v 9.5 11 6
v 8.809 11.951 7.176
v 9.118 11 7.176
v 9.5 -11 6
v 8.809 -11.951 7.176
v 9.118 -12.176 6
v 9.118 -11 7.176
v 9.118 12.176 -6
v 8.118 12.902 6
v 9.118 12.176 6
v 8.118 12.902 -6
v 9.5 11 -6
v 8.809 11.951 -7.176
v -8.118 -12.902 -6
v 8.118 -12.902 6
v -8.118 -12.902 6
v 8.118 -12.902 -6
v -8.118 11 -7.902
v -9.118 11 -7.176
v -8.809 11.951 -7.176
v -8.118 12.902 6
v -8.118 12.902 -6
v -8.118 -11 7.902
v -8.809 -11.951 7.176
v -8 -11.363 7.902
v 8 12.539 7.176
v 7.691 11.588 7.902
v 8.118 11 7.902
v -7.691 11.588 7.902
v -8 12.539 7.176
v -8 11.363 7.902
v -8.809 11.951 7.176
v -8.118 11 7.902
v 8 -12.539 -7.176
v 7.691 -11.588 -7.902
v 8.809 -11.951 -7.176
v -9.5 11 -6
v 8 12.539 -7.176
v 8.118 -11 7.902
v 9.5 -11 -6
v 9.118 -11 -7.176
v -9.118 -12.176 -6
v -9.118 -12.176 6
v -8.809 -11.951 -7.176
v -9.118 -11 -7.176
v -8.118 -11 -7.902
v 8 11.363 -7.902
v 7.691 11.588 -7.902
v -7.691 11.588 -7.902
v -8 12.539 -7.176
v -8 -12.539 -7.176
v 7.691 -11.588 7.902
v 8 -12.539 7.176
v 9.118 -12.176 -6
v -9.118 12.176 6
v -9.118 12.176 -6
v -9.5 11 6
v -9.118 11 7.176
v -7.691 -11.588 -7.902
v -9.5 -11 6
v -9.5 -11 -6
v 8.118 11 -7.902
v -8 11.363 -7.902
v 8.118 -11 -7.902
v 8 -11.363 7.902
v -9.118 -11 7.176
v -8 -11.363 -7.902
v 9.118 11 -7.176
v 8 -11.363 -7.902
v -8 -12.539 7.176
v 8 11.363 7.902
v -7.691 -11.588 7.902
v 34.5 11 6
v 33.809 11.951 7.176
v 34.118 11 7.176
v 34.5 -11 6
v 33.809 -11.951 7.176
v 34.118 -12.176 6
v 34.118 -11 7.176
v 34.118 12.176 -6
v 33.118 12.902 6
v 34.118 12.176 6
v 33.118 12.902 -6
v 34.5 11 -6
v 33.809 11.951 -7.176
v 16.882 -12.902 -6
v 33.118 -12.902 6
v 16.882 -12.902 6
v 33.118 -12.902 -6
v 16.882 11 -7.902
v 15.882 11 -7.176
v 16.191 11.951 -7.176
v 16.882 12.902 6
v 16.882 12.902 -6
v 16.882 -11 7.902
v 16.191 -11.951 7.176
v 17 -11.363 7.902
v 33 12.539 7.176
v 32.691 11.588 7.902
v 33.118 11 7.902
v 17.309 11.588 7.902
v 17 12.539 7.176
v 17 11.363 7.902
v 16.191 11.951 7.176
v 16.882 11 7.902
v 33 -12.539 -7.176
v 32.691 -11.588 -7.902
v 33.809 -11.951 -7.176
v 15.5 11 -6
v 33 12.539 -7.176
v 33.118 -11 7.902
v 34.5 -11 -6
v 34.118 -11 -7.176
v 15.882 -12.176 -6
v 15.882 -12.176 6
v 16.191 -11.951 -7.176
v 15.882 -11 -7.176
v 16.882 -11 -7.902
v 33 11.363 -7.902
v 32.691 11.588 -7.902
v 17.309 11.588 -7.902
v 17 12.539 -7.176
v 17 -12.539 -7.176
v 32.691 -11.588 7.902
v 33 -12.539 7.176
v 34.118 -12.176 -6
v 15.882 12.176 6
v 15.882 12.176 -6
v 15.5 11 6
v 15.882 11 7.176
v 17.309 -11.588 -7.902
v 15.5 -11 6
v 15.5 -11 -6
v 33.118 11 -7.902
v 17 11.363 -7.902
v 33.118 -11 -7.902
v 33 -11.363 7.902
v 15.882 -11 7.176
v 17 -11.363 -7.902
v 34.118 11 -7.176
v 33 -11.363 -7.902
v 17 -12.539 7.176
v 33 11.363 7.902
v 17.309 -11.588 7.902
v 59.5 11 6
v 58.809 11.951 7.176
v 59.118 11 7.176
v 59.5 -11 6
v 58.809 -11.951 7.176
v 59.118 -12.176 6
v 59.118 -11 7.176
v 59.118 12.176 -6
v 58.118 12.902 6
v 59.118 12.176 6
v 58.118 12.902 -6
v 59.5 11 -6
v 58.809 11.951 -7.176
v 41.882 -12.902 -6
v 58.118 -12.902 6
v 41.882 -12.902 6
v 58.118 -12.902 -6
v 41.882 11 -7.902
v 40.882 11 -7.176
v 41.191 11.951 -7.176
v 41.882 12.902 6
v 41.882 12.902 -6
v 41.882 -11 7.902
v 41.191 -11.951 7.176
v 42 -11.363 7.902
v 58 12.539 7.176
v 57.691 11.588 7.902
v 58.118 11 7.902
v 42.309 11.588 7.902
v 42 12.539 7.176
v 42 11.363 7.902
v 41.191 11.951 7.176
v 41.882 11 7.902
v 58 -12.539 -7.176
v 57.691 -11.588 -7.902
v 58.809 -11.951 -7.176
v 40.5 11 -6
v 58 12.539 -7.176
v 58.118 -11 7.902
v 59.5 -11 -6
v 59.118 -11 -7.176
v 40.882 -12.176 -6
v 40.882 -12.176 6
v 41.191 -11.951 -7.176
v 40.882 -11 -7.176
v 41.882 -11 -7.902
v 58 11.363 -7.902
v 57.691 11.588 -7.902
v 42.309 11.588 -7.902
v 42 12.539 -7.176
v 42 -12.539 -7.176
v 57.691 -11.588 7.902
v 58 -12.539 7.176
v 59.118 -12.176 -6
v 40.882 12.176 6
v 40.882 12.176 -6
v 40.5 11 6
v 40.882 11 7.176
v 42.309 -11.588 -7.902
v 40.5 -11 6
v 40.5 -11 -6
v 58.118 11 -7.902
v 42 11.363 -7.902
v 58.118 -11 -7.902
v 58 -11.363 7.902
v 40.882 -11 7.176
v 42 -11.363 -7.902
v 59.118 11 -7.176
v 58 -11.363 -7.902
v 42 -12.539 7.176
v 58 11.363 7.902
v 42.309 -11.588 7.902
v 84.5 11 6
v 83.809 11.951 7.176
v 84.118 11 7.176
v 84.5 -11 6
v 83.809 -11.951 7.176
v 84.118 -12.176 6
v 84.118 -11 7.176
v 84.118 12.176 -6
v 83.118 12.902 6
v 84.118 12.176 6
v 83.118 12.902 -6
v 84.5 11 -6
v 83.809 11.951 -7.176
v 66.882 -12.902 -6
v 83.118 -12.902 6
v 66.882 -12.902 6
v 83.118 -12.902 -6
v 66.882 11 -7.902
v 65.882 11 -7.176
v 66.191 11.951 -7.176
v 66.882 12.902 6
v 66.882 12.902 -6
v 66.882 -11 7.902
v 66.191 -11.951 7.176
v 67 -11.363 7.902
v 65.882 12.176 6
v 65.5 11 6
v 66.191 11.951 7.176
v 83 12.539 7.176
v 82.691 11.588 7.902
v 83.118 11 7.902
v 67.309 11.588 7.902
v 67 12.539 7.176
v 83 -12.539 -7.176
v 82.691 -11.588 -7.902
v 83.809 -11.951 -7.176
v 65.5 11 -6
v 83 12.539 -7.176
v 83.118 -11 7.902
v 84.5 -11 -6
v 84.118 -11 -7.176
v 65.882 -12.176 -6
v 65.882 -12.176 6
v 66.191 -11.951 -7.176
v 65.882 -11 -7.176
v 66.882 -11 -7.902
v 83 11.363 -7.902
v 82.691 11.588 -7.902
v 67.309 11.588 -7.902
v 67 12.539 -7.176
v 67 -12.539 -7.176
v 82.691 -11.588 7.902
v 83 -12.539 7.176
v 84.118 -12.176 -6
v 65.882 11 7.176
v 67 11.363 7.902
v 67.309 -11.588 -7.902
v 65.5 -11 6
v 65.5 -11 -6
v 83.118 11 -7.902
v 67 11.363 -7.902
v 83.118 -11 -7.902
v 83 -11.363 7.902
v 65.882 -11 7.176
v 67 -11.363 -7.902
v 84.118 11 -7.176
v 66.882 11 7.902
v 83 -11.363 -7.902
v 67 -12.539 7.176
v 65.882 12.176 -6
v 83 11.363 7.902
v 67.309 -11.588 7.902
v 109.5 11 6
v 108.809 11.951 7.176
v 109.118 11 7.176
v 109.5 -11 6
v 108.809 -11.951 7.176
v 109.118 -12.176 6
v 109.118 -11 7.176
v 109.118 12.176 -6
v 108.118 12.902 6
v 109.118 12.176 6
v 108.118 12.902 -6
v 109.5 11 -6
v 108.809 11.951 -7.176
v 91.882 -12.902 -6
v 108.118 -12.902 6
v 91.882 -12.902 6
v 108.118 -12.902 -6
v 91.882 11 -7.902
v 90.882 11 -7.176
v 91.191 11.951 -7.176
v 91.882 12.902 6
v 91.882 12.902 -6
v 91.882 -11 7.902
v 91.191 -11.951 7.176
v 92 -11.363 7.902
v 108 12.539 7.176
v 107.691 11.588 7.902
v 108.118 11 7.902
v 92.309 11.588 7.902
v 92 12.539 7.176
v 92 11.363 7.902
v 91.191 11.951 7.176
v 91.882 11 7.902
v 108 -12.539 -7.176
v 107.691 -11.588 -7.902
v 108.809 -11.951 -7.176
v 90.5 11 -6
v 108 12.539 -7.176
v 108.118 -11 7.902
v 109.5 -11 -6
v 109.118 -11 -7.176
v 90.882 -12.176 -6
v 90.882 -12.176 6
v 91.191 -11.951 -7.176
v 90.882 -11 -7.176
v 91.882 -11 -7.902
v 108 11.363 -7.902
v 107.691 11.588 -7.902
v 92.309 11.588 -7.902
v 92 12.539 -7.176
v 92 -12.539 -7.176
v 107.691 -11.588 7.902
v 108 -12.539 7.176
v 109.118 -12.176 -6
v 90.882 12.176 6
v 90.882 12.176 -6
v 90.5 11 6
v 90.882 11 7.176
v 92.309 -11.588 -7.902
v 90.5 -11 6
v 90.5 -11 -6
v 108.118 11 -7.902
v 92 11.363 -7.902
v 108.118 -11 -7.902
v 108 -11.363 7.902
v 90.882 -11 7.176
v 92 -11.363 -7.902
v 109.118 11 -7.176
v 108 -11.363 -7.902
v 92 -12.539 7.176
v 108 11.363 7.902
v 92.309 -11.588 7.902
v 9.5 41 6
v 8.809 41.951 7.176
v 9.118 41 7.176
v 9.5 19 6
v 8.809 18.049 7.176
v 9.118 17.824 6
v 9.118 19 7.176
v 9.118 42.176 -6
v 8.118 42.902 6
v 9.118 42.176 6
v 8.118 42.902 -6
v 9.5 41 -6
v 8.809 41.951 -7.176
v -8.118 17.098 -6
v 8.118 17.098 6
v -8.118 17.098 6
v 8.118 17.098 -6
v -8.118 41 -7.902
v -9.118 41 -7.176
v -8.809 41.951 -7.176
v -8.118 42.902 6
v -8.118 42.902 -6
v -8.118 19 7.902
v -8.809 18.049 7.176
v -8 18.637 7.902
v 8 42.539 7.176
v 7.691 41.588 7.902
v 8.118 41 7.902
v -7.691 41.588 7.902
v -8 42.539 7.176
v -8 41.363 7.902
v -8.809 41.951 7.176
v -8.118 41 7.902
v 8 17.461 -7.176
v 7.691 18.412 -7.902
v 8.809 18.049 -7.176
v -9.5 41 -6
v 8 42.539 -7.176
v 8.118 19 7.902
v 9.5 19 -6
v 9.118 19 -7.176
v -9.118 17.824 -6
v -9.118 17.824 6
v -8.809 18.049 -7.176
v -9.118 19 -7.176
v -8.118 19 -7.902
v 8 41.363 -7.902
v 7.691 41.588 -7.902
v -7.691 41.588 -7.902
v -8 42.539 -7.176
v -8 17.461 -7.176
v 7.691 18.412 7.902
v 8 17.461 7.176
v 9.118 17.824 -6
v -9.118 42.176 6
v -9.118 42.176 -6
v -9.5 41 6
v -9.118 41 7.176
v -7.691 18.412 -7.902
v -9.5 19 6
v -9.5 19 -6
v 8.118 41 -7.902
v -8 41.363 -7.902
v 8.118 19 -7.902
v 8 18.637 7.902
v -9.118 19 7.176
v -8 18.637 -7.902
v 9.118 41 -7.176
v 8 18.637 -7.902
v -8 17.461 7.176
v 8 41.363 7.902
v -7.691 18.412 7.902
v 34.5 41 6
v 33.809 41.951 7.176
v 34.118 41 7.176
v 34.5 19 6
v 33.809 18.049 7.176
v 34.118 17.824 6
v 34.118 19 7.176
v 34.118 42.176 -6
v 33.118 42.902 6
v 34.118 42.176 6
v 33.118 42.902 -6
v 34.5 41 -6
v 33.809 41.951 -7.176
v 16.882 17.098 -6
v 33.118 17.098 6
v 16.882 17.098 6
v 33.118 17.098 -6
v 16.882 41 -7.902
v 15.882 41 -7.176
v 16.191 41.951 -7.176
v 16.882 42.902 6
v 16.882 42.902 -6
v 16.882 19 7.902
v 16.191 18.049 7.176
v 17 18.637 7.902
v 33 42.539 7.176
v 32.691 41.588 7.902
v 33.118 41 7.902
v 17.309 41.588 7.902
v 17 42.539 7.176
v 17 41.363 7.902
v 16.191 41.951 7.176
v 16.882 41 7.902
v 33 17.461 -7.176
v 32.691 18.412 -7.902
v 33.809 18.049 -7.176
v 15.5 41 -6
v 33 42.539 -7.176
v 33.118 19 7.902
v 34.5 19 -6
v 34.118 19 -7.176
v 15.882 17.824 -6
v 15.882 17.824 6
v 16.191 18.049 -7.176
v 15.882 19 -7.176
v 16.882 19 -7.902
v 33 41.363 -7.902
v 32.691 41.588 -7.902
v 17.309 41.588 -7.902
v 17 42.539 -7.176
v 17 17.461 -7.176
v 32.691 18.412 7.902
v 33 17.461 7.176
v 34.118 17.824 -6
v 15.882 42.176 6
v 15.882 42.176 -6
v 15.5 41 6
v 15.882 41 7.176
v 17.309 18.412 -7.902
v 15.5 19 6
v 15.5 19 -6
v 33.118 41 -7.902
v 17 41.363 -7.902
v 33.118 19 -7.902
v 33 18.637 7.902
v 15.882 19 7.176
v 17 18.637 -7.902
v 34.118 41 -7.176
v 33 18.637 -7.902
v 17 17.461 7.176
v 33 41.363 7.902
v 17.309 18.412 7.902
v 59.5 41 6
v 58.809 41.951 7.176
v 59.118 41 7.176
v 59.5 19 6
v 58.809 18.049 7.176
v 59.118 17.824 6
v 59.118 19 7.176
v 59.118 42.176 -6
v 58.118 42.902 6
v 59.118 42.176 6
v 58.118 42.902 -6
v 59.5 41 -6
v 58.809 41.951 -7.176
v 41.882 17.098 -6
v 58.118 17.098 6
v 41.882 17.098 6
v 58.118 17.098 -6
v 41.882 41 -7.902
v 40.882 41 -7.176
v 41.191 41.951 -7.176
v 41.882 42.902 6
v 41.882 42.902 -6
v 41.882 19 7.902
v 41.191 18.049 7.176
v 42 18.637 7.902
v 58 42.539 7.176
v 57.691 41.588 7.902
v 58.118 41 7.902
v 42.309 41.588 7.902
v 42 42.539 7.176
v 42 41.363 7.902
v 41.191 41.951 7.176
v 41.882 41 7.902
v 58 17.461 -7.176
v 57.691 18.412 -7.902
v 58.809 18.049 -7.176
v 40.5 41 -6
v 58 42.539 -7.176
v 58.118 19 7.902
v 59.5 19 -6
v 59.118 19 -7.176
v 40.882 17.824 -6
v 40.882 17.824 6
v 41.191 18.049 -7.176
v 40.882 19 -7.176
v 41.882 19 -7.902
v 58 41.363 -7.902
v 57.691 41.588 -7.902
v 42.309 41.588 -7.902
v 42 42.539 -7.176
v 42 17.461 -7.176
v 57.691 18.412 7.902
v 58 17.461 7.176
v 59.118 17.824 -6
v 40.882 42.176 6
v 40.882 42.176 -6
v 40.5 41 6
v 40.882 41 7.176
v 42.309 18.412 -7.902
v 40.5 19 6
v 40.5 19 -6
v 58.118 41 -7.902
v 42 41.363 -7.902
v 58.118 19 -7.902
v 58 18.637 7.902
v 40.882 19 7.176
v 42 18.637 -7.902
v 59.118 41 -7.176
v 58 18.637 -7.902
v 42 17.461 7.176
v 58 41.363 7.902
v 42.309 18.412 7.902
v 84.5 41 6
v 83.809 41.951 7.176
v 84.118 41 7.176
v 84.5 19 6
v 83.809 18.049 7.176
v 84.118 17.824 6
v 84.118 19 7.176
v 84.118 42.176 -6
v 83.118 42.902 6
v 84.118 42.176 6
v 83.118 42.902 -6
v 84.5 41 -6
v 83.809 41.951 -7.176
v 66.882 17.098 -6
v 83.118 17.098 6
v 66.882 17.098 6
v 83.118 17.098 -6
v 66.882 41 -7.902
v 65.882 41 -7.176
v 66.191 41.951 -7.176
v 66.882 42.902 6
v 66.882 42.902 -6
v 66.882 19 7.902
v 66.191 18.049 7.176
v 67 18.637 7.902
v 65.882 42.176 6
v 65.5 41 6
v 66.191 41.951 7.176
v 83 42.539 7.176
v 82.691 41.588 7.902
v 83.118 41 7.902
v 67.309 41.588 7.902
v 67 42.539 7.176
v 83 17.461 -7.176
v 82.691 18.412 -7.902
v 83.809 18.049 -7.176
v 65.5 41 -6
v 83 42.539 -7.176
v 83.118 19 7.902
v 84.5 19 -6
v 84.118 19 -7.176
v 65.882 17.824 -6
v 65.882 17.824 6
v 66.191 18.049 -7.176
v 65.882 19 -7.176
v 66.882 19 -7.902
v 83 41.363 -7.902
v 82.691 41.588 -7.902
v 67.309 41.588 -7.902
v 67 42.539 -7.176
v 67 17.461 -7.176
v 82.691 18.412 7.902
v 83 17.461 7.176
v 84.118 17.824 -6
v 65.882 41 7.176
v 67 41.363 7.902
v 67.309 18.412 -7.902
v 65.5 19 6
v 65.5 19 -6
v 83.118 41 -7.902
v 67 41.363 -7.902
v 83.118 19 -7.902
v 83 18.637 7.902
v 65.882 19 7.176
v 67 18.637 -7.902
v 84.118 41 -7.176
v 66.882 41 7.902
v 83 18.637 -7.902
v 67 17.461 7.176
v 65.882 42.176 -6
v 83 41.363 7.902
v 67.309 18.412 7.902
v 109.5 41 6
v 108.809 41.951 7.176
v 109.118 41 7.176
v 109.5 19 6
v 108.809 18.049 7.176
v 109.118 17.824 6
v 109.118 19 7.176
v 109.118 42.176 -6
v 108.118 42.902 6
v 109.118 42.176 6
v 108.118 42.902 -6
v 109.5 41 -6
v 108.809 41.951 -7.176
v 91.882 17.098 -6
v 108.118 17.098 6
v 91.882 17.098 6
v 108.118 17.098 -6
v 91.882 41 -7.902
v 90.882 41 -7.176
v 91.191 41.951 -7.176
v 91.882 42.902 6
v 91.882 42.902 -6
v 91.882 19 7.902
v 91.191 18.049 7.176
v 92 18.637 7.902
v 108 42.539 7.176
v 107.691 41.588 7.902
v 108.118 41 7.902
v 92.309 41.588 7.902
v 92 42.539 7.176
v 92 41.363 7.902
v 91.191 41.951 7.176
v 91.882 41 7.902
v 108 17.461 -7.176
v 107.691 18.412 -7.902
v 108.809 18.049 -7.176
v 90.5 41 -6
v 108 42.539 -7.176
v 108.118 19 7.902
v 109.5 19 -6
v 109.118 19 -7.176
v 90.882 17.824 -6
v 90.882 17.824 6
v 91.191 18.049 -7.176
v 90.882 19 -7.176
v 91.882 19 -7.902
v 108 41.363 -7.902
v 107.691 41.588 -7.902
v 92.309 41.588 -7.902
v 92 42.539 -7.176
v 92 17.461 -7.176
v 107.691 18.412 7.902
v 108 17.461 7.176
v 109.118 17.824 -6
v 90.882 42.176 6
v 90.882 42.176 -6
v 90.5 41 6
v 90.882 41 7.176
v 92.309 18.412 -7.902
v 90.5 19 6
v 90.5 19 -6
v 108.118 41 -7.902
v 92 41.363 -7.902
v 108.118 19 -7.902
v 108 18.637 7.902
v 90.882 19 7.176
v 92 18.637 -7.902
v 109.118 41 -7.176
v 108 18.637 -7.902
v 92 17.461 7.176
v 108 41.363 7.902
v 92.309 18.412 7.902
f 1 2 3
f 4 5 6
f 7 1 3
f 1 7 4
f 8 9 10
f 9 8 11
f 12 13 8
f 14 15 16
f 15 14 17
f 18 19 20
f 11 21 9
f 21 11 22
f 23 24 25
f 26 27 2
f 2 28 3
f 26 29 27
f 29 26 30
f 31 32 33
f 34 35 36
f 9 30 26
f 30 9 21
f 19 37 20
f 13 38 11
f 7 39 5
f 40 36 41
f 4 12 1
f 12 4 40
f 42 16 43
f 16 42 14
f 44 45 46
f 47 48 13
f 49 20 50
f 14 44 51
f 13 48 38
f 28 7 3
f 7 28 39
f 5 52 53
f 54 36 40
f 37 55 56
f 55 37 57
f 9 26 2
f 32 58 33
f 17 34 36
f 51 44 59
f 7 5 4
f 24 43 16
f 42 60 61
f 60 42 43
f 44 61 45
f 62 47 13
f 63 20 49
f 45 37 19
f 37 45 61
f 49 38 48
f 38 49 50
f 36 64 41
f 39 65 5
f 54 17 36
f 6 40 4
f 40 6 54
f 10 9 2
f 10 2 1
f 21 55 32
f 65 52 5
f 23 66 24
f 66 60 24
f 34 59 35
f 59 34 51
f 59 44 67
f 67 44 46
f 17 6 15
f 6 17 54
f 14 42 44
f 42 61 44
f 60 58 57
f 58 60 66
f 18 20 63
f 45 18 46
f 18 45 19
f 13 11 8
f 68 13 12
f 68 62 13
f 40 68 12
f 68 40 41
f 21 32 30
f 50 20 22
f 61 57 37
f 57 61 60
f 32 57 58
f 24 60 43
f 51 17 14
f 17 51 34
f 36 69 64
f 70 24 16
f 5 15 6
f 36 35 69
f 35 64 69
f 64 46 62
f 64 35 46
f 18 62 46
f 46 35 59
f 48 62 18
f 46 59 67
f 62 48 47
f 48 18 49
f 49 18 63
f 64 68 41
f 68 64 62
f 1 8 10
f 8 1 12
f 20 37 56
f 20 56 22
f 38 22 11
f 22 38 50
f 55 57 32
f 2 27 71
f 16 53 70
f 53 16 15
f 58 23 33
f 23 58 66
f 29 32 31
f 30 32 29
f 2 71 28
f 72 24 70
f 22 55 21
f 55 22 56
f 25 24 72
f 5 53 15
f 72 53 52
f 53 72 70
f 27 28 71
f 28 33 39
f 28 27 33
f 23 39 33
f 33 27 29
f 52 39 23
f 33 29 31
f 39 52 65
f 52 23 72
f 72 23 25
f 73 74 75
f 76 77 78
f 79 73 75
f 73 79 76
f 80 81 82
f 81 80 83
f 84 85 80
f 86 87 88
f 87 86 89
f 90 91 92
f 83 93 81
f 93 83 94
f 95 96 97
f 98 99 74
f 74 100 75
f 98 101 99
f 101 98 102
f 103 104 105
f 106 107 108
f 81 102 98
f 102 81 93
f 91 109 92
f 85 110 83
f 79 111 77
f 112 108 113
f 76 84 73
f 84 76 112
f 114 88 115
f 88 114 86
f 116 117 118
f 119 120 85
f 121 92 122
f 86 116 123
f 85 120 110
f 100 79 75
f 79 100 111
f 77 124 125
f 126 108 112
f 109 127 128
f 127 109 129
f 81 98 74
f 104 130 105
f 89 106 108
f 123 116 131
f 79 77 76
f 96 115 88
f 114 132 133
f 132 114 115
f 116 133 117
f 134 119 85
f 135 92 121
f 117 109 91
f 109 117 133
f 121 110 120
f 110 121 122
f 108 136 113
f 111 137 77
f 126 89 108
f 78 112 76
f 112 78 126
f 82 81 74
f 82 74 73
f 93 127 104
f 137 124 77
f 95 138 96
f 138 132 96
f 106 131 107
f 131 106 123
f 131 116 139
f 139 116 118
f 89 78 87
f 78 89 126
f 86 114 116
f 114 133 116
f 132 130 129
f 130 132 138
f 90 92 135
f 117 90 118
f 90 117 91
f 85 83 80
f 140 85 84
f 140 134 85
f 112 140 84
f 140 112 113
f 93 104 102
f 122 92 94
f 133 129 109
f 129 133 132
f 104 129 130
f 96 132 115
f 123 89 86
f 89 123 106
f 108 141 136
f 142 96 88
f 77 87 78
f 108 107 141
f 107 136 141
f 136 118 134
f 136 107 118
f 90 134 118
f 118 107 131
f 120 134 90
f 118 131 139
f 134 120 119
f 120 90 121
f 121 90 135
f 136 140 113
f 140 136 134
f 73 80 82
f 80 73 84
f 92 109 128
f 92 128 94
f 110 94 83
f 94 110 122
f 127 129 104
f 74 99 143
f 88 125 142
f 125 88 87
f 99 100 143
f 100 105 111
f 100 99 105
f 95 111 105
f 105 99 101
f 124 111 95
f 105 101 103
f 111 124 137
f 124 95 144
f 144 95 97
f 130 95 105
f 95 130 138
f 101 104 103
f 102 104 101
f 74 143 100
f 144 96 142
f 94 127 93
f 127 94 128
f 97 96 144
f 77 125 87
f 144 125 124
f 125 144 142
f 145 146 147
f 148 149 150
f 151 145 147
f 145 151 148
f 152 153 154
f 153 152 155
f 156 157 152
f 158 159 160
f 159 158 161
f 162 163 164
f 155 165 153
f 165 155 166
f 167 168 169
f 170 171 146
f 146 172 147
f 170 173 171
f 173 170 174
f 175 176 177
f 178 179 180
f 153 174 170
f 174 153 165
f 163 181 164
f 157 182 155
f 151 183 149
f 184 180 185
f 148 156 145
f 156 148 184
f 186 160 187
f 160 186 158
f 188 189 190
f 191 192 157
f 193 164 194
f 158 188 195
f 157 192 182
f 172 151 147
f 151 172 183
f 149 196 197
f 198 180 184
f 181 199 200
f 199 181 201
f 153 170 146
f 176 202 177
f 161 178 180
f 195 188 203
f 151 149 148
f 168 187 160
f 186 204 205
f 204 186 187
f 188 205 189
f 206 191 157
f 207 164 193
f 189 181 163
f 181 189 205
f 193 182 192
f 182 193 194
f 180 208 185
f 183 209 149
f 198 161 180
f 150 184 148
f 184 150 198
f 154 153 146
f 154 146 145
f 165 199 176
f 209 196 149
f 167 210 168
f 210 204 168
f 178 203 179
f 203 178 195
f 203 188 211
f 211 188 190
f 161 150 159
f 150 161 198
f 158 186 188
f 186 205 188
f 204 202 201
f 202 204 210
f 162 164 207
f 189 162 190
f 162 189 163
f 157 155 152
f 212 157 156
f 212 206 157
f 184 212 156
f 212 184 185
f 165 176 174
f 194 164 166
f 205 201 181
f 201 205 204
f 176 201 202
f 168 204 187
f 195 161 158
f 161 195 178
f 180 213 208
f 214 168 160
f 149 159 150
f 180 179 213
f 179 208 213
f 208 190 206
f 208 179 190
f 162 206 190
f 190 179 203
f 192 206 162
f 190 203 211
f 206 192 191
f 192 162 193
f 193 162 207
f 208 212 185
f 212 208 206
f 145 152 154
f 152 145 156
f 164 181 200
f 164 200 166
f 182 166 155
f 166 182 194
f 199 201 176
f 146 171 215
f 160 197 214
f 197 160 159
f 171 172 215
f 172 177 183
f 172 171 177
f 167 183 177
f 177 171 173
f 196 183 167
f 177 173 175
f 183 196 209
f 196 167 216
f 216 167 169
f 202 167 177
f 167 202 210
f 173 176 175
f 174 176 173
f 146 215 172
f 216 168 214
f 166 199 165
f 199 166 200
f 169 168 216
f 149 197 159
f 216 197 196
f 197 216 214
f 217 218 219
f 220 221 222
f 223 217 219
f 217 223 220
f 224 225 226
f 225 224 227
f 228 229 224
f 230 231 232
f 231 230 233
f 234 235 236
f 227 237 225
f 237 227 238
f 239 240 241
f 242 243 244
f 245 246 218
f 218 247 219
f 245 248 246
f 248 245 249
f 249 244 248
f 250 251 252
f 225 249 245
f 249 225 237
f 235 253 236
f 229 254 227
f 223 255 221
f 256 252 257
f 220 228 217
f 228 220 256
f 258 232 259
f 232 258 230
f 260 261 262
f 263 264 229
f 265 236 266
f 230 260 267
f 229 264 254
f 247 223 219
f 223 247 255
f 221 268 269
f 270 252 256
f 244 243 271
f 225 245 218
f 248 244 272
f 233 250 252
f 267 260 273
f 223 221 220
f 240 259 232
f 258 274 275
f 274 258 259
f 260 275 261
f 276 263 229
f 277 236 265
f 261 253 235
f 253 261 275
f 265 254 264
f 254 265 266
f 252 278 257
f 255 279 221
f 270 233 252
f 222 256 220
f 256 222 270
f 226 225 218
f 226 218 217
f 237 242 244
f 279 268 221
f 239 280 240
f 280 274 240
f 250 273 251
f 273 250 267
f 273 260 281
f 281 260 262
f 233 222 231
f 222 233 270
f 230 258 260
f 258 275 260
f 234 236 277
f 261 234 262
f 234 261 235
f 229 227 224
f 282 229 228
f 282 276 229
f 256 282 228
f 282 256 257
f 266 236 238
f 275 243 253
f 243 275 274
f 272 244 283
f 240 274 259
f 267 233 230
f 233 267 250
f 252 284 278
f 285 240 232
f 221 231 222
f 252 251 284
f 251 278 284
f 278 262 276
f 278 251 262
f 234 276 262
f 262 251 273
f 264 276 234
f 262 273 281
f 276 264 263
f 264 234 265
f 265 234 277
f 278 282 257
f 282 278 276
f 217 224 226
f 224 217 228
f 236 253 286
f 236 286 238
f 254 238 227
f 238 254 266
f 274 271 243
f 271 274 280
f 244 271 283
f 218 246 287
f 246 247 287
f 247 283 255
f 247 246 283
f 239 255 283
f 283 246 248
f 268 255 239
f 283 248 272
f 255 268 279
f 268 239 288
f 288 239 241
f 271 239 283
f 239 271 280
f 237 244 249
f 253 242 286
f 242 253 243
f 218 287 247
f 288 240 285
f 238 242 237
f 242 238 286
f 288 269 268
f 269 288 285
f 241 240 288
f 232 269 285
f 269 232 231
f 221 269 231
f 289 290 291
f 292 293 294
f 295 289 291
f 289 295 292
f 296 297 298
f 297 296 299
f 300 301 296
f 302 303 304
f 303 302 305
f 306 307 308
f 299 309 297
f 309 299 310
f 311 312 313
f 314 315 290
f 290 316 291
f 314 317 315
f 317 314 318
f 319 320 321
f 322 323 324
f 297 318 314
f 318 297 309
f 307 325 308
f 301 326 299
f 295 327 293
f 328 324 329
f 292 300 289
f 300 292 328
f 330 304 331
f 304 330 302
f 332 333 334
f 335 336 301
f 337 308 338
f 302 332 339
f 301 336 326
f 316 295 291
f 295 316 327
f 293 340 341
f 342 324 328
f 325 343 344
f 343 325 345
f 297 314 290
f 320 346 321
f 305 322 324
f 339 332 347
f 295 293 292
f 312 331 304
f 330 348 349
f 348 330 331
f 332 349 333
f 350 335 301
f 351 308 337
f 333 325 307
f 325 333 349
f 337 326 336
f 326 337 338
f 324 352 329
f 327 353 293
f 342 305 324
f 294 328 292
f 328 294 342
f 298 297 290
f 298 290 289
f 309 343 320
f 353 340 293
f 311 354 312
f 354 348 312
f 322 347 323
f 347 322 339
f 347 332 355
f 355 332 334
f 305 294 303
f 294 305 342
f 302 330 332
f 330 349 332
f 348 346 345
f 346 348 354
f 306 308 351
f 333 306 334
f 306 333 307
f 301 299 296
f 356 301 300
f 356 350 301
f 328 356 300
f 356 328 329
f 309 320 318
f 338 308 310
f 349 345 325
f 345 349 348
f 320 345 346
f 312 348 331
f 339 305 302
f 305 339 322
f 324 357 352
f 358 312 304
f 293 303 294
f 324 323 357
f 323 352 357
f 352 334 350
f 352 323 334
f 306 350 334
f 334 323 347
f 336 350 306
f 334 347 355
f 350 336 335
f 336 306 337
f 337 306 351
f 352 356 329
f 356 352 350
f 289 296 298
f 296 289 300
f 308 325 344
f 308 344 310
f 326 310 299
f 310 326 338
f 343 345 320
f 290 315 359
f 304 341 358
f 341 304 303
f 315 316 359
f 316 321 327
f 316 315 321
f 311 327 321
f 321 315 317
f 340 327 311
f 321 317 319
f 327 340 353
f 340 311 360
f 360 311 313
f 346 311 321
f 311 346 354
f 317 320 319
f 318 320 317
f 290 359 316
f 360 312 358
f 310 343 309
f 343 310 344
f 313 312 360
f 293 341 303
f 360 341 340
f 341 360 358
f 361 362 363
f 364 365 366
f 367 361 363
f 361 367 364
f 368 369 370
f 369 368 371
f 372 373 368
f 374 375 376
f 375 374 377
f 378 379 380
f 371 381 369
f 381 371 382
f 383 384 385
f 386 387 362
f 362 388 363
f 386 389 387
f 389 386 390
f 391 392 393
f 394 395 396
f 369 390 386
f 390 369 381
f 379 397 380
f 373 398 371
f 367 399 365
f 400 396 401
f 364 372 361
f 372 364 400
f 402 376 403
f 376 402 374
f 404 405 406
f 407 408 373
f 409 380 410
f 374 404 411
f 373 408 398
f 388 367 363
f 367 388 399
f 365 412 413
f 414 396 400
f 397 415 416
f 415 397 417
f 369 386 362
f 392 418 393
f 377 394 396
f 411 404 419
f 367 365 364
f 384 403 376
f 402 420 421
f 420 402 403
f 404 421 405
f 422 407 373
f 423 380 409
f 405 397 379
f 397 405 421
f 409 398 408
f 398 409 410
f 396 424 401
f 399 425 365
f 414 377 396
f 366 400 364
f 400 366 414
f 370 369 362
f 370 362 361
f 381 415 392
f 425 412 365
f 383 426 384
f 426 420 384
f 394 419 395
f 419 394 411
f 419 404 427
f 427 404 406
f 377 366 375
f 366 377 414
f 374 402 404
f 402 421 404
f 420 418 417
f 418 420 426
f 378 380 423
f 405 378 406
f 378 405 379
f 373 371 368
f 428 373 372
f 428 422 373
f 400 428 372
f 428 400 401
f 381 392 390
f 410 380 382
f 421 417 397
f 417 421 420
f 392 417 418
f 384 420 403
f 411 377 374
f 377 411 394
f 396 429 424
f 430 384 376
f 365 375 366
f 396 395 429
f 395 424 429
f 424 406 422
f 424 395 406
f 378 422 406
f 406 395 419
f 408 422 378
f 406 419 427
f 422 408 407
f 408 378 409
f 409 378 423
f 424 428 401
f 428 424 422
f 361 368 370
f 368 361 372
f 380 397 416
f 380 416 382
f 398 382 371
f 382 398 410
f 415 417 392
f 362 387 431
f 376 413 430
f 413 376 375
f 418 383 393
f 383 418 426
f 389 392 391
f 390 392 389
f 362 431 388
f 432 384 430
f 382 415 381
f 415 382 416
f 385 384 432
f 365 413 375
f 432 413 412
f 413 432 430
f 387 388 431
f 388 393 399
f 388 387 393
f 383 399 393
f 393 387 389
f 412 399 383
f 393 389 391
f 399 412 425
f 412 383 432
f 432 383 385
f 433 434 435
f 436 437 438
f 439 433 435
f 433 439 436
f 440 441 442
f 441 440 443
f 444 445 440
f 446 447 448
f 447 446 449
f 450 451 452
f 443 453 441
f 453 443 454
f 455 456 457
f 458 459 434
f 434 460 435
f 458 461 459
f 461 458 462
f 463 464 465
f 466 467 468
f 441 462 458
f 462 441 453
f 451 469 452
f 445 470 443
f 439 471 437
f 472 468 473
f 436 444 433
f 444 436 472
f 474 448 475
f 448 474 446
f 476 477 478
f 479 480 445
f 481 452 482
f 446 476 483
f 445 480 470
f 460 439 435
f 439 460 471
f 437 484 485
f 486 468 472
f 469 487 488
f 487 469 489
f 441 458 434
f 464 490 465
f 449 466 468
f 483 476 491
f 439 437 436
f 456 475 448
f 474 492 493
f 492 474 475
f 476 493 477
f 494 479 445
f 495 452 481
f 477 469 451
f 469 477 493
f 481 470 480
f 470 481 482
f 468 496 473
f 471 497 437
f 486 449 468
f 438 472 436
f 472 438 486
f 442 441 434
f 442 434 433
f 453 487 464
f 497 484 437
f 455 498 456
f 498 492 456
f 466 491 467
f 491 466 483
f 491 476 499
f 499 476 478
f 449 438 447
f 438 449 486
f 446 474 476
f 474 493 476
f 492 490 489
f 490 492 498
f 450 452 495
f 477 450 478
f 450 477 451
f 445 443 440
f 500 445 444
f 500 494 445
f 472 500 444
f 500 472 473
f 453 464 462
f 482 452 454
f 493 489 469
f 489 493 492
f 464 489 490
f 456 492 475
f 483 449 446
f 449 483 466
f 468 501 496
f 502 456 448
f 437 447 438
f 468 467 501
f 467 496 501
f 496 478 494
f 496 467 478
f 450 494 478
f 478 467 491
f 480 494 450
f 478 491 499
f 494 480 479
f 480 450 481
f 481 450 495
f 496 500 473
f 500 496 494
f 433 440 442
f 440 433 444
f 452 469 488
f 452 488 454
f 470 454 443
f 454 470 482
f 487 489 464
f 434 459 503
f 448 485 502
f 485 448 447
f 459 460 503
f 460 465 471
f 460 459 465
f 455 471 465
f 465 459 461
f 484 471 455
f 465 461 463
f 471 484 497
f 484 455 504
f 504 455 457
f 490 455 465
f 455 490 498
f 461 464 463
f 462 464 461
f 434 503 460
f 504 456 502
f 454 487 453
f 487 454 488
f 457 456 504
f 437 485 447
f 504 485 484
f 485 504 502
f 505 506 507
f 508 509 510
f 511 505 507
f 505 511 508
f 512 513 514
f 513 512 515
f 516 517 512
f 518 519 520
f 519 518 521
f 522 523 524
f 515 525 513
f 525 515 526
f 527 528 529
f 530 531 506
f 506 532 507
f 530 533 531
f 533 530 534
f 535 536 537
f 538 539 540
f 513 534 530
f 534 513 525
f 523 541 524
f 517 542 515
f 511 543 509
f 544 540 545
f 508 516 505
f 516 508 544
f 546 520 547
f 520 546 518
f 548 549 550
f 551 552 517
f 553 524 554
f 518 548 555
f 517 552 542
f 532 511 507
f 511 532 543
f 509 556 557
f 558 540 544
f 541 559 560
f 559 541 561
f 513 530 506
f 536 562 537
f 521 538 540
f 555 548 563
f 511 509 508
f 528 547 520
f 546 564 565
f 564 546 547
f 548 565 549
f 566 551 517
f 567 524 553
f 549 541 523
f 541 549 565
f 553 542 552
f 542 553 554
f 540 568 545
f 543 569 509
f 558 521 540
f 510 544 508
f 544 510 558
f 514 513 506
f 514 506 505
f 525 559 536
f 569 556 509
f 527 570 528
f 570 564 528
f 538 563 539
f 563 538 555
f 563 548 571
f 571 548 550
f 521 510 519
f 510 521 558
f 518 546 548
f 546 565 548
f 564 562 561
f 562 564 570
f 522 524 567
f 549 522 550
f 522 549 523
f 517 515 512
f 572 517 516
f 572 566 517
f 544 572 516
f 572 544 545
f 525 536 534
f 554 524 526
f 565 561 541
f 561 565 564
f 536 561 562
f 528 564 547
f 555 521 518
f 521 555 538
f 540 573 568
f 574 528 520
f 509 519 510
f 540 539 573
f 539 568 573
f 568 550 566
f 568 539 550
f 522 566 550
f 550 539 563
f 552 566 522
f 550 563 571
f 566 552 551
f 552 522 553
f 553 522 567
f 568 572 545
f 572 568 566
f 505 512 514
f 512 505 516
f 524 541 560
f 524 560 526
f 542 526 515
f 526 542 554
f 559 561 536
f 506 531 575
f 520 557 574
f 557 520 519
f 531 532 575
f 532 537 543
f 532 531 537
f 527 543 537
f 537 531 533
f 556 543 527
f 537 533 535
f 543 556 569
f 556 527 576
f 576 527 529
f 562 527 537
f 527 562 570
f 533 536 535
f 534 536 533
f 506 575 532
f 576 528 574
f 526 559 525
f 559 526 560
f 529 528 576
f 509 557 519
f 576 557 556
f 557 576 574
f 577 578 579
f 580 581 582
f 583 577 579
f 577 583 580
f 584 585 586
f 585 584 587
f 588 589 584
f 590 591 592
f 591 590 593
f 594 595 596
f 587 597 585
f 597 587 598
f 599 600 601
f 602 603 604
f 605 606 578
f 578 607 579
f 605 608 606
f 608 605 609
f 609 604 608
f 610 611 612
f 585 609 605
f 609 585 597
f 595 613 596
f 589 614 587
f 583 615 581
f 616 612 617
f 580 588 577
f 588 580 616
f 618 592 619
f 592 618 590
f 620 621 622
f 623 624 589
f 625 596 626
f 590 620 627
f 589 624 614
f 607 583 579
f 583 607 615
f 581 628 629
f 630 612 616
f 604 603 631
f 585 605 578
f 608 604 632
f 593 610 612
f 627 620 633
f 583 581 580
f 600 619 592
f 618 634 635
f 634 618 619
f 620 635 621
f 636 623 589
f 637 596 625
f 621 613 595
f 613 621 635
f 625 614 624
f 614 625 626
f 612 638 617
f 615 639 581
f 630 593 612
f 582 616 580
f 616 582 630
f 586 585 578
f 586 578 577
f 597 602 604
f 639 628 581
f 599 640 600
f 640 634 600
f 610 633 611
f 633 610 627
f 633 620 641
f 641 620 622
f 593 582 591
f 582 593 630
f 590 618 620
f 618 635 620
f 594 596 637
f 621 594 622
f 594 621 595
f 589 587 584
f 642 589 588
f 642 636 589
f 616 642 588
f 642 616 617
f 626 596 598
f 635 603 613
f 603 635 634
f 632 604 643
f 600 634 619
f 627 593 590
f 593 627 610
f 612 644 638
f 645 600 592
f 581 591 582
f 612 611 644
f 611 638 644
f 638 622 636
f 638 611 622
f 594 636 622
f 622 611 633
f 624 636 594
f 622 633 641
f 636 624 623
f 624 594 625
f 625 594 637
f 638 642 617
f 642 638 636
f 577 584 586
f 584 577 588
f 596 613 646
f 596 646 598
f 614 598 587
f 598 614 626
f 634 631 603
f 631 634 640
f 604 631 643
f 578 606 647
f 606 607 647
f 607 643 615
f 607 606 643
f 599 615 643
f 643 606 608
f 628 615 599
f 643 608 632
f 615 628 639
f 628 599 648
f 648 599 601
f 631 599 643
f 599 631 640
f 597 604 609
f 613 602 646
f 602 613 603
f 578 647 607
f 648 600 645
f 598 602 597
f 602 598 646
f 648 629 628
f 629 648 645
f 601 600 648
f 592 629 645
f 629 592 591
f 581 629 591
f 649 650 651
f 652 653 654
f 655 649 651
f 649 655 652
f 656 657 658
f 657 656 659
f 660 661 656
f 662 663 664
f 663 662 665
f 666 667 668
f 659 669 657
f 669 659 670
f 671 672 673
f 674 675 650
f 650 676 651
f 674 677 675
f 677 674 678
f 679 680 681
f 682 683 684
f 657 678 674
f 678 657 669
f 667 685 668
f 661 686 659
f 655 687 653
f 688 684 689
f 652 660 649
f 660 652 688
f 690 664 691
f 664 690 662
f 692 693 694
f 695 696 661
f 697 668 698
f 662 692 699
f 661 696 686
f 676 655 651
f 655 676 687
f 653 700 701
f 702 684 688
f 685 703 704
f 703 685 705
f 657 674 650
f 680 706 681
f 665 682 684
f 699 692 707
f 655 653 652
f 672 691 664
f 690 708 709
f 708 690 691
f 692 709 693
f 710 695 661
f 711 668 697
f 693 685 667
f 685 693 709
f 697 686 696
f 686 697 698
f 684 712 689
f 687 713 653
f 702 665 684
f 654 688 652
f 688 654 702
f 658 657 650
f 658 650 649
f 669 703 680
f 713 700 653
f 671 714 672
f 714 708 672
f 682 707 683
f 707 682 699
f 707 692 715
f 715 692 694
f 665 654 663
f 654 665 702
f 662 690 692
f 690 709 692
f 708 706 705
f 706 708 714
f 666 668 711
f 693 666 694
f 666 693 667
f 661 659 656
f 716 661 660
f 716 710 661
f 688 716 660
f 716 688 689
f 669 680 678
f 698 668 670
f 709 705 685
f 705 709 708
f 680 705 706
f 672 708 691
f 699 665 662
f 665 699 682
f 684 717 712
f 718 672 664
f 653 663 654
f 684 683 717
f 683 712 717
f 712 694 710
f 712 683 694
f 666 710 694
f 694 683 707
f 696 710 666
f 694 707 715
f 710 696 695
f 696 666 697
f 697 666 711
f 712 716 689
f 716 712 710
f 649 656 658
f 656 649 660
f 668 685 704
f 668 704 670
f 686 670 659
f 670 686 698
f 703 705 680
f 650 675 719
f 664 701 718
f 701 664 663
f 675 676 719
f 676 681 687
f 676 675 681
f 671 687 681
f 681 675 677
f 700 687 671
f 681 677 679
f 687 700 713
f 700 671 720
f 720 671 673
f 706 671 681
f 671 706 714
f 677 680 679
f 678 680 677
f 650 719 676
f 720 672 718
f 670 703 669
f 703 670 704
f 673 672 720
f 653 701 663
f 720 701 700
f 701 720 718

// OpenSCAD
//variables to change different parts of the tile

//number of faces on tile (helps for optimization but more needed 
//for smoother tiles -> increased processing time)
$fn = 10;

//columns = number of columns to render per row
columns = 5;
//rows = number of rows to render
rows = 2;

//Width, Height, and Length of the tiles. IN MM
//(Height and Width are the front of the tiles, length is the depth)
tileWidth = 16;
tileHeight = 26;
tileLength = 19;
//Radius of the chamfer to be added to the tile. 0-4 reccommended.
//also in MM
chamferRadius = 2;


module mahjongtile(w = tileWidth, h = tileHeight, d = tileLength, r = chamferRadius){
    minkowski(){
    cube([d-(2*r), h-(2*r), w-(2*r)], center=true);
    sphere(r);
    }
}

//Generate 10 Tiles: range 0-1 for rows (2 rows) and 0-4 for cols (5 columns)
//Row loop
for(row = [0:1:(rows-1)]){
    //shift by 30 units (mm)
    translate([0,row*30,0])
    
    //Column Loop
    for (col = [0:1:(columns-1)]){
        //Shift by 25 units (per col)
        translate([col*25,0,0])
        //Generate Tile
        mahjongtile();
    }
}
